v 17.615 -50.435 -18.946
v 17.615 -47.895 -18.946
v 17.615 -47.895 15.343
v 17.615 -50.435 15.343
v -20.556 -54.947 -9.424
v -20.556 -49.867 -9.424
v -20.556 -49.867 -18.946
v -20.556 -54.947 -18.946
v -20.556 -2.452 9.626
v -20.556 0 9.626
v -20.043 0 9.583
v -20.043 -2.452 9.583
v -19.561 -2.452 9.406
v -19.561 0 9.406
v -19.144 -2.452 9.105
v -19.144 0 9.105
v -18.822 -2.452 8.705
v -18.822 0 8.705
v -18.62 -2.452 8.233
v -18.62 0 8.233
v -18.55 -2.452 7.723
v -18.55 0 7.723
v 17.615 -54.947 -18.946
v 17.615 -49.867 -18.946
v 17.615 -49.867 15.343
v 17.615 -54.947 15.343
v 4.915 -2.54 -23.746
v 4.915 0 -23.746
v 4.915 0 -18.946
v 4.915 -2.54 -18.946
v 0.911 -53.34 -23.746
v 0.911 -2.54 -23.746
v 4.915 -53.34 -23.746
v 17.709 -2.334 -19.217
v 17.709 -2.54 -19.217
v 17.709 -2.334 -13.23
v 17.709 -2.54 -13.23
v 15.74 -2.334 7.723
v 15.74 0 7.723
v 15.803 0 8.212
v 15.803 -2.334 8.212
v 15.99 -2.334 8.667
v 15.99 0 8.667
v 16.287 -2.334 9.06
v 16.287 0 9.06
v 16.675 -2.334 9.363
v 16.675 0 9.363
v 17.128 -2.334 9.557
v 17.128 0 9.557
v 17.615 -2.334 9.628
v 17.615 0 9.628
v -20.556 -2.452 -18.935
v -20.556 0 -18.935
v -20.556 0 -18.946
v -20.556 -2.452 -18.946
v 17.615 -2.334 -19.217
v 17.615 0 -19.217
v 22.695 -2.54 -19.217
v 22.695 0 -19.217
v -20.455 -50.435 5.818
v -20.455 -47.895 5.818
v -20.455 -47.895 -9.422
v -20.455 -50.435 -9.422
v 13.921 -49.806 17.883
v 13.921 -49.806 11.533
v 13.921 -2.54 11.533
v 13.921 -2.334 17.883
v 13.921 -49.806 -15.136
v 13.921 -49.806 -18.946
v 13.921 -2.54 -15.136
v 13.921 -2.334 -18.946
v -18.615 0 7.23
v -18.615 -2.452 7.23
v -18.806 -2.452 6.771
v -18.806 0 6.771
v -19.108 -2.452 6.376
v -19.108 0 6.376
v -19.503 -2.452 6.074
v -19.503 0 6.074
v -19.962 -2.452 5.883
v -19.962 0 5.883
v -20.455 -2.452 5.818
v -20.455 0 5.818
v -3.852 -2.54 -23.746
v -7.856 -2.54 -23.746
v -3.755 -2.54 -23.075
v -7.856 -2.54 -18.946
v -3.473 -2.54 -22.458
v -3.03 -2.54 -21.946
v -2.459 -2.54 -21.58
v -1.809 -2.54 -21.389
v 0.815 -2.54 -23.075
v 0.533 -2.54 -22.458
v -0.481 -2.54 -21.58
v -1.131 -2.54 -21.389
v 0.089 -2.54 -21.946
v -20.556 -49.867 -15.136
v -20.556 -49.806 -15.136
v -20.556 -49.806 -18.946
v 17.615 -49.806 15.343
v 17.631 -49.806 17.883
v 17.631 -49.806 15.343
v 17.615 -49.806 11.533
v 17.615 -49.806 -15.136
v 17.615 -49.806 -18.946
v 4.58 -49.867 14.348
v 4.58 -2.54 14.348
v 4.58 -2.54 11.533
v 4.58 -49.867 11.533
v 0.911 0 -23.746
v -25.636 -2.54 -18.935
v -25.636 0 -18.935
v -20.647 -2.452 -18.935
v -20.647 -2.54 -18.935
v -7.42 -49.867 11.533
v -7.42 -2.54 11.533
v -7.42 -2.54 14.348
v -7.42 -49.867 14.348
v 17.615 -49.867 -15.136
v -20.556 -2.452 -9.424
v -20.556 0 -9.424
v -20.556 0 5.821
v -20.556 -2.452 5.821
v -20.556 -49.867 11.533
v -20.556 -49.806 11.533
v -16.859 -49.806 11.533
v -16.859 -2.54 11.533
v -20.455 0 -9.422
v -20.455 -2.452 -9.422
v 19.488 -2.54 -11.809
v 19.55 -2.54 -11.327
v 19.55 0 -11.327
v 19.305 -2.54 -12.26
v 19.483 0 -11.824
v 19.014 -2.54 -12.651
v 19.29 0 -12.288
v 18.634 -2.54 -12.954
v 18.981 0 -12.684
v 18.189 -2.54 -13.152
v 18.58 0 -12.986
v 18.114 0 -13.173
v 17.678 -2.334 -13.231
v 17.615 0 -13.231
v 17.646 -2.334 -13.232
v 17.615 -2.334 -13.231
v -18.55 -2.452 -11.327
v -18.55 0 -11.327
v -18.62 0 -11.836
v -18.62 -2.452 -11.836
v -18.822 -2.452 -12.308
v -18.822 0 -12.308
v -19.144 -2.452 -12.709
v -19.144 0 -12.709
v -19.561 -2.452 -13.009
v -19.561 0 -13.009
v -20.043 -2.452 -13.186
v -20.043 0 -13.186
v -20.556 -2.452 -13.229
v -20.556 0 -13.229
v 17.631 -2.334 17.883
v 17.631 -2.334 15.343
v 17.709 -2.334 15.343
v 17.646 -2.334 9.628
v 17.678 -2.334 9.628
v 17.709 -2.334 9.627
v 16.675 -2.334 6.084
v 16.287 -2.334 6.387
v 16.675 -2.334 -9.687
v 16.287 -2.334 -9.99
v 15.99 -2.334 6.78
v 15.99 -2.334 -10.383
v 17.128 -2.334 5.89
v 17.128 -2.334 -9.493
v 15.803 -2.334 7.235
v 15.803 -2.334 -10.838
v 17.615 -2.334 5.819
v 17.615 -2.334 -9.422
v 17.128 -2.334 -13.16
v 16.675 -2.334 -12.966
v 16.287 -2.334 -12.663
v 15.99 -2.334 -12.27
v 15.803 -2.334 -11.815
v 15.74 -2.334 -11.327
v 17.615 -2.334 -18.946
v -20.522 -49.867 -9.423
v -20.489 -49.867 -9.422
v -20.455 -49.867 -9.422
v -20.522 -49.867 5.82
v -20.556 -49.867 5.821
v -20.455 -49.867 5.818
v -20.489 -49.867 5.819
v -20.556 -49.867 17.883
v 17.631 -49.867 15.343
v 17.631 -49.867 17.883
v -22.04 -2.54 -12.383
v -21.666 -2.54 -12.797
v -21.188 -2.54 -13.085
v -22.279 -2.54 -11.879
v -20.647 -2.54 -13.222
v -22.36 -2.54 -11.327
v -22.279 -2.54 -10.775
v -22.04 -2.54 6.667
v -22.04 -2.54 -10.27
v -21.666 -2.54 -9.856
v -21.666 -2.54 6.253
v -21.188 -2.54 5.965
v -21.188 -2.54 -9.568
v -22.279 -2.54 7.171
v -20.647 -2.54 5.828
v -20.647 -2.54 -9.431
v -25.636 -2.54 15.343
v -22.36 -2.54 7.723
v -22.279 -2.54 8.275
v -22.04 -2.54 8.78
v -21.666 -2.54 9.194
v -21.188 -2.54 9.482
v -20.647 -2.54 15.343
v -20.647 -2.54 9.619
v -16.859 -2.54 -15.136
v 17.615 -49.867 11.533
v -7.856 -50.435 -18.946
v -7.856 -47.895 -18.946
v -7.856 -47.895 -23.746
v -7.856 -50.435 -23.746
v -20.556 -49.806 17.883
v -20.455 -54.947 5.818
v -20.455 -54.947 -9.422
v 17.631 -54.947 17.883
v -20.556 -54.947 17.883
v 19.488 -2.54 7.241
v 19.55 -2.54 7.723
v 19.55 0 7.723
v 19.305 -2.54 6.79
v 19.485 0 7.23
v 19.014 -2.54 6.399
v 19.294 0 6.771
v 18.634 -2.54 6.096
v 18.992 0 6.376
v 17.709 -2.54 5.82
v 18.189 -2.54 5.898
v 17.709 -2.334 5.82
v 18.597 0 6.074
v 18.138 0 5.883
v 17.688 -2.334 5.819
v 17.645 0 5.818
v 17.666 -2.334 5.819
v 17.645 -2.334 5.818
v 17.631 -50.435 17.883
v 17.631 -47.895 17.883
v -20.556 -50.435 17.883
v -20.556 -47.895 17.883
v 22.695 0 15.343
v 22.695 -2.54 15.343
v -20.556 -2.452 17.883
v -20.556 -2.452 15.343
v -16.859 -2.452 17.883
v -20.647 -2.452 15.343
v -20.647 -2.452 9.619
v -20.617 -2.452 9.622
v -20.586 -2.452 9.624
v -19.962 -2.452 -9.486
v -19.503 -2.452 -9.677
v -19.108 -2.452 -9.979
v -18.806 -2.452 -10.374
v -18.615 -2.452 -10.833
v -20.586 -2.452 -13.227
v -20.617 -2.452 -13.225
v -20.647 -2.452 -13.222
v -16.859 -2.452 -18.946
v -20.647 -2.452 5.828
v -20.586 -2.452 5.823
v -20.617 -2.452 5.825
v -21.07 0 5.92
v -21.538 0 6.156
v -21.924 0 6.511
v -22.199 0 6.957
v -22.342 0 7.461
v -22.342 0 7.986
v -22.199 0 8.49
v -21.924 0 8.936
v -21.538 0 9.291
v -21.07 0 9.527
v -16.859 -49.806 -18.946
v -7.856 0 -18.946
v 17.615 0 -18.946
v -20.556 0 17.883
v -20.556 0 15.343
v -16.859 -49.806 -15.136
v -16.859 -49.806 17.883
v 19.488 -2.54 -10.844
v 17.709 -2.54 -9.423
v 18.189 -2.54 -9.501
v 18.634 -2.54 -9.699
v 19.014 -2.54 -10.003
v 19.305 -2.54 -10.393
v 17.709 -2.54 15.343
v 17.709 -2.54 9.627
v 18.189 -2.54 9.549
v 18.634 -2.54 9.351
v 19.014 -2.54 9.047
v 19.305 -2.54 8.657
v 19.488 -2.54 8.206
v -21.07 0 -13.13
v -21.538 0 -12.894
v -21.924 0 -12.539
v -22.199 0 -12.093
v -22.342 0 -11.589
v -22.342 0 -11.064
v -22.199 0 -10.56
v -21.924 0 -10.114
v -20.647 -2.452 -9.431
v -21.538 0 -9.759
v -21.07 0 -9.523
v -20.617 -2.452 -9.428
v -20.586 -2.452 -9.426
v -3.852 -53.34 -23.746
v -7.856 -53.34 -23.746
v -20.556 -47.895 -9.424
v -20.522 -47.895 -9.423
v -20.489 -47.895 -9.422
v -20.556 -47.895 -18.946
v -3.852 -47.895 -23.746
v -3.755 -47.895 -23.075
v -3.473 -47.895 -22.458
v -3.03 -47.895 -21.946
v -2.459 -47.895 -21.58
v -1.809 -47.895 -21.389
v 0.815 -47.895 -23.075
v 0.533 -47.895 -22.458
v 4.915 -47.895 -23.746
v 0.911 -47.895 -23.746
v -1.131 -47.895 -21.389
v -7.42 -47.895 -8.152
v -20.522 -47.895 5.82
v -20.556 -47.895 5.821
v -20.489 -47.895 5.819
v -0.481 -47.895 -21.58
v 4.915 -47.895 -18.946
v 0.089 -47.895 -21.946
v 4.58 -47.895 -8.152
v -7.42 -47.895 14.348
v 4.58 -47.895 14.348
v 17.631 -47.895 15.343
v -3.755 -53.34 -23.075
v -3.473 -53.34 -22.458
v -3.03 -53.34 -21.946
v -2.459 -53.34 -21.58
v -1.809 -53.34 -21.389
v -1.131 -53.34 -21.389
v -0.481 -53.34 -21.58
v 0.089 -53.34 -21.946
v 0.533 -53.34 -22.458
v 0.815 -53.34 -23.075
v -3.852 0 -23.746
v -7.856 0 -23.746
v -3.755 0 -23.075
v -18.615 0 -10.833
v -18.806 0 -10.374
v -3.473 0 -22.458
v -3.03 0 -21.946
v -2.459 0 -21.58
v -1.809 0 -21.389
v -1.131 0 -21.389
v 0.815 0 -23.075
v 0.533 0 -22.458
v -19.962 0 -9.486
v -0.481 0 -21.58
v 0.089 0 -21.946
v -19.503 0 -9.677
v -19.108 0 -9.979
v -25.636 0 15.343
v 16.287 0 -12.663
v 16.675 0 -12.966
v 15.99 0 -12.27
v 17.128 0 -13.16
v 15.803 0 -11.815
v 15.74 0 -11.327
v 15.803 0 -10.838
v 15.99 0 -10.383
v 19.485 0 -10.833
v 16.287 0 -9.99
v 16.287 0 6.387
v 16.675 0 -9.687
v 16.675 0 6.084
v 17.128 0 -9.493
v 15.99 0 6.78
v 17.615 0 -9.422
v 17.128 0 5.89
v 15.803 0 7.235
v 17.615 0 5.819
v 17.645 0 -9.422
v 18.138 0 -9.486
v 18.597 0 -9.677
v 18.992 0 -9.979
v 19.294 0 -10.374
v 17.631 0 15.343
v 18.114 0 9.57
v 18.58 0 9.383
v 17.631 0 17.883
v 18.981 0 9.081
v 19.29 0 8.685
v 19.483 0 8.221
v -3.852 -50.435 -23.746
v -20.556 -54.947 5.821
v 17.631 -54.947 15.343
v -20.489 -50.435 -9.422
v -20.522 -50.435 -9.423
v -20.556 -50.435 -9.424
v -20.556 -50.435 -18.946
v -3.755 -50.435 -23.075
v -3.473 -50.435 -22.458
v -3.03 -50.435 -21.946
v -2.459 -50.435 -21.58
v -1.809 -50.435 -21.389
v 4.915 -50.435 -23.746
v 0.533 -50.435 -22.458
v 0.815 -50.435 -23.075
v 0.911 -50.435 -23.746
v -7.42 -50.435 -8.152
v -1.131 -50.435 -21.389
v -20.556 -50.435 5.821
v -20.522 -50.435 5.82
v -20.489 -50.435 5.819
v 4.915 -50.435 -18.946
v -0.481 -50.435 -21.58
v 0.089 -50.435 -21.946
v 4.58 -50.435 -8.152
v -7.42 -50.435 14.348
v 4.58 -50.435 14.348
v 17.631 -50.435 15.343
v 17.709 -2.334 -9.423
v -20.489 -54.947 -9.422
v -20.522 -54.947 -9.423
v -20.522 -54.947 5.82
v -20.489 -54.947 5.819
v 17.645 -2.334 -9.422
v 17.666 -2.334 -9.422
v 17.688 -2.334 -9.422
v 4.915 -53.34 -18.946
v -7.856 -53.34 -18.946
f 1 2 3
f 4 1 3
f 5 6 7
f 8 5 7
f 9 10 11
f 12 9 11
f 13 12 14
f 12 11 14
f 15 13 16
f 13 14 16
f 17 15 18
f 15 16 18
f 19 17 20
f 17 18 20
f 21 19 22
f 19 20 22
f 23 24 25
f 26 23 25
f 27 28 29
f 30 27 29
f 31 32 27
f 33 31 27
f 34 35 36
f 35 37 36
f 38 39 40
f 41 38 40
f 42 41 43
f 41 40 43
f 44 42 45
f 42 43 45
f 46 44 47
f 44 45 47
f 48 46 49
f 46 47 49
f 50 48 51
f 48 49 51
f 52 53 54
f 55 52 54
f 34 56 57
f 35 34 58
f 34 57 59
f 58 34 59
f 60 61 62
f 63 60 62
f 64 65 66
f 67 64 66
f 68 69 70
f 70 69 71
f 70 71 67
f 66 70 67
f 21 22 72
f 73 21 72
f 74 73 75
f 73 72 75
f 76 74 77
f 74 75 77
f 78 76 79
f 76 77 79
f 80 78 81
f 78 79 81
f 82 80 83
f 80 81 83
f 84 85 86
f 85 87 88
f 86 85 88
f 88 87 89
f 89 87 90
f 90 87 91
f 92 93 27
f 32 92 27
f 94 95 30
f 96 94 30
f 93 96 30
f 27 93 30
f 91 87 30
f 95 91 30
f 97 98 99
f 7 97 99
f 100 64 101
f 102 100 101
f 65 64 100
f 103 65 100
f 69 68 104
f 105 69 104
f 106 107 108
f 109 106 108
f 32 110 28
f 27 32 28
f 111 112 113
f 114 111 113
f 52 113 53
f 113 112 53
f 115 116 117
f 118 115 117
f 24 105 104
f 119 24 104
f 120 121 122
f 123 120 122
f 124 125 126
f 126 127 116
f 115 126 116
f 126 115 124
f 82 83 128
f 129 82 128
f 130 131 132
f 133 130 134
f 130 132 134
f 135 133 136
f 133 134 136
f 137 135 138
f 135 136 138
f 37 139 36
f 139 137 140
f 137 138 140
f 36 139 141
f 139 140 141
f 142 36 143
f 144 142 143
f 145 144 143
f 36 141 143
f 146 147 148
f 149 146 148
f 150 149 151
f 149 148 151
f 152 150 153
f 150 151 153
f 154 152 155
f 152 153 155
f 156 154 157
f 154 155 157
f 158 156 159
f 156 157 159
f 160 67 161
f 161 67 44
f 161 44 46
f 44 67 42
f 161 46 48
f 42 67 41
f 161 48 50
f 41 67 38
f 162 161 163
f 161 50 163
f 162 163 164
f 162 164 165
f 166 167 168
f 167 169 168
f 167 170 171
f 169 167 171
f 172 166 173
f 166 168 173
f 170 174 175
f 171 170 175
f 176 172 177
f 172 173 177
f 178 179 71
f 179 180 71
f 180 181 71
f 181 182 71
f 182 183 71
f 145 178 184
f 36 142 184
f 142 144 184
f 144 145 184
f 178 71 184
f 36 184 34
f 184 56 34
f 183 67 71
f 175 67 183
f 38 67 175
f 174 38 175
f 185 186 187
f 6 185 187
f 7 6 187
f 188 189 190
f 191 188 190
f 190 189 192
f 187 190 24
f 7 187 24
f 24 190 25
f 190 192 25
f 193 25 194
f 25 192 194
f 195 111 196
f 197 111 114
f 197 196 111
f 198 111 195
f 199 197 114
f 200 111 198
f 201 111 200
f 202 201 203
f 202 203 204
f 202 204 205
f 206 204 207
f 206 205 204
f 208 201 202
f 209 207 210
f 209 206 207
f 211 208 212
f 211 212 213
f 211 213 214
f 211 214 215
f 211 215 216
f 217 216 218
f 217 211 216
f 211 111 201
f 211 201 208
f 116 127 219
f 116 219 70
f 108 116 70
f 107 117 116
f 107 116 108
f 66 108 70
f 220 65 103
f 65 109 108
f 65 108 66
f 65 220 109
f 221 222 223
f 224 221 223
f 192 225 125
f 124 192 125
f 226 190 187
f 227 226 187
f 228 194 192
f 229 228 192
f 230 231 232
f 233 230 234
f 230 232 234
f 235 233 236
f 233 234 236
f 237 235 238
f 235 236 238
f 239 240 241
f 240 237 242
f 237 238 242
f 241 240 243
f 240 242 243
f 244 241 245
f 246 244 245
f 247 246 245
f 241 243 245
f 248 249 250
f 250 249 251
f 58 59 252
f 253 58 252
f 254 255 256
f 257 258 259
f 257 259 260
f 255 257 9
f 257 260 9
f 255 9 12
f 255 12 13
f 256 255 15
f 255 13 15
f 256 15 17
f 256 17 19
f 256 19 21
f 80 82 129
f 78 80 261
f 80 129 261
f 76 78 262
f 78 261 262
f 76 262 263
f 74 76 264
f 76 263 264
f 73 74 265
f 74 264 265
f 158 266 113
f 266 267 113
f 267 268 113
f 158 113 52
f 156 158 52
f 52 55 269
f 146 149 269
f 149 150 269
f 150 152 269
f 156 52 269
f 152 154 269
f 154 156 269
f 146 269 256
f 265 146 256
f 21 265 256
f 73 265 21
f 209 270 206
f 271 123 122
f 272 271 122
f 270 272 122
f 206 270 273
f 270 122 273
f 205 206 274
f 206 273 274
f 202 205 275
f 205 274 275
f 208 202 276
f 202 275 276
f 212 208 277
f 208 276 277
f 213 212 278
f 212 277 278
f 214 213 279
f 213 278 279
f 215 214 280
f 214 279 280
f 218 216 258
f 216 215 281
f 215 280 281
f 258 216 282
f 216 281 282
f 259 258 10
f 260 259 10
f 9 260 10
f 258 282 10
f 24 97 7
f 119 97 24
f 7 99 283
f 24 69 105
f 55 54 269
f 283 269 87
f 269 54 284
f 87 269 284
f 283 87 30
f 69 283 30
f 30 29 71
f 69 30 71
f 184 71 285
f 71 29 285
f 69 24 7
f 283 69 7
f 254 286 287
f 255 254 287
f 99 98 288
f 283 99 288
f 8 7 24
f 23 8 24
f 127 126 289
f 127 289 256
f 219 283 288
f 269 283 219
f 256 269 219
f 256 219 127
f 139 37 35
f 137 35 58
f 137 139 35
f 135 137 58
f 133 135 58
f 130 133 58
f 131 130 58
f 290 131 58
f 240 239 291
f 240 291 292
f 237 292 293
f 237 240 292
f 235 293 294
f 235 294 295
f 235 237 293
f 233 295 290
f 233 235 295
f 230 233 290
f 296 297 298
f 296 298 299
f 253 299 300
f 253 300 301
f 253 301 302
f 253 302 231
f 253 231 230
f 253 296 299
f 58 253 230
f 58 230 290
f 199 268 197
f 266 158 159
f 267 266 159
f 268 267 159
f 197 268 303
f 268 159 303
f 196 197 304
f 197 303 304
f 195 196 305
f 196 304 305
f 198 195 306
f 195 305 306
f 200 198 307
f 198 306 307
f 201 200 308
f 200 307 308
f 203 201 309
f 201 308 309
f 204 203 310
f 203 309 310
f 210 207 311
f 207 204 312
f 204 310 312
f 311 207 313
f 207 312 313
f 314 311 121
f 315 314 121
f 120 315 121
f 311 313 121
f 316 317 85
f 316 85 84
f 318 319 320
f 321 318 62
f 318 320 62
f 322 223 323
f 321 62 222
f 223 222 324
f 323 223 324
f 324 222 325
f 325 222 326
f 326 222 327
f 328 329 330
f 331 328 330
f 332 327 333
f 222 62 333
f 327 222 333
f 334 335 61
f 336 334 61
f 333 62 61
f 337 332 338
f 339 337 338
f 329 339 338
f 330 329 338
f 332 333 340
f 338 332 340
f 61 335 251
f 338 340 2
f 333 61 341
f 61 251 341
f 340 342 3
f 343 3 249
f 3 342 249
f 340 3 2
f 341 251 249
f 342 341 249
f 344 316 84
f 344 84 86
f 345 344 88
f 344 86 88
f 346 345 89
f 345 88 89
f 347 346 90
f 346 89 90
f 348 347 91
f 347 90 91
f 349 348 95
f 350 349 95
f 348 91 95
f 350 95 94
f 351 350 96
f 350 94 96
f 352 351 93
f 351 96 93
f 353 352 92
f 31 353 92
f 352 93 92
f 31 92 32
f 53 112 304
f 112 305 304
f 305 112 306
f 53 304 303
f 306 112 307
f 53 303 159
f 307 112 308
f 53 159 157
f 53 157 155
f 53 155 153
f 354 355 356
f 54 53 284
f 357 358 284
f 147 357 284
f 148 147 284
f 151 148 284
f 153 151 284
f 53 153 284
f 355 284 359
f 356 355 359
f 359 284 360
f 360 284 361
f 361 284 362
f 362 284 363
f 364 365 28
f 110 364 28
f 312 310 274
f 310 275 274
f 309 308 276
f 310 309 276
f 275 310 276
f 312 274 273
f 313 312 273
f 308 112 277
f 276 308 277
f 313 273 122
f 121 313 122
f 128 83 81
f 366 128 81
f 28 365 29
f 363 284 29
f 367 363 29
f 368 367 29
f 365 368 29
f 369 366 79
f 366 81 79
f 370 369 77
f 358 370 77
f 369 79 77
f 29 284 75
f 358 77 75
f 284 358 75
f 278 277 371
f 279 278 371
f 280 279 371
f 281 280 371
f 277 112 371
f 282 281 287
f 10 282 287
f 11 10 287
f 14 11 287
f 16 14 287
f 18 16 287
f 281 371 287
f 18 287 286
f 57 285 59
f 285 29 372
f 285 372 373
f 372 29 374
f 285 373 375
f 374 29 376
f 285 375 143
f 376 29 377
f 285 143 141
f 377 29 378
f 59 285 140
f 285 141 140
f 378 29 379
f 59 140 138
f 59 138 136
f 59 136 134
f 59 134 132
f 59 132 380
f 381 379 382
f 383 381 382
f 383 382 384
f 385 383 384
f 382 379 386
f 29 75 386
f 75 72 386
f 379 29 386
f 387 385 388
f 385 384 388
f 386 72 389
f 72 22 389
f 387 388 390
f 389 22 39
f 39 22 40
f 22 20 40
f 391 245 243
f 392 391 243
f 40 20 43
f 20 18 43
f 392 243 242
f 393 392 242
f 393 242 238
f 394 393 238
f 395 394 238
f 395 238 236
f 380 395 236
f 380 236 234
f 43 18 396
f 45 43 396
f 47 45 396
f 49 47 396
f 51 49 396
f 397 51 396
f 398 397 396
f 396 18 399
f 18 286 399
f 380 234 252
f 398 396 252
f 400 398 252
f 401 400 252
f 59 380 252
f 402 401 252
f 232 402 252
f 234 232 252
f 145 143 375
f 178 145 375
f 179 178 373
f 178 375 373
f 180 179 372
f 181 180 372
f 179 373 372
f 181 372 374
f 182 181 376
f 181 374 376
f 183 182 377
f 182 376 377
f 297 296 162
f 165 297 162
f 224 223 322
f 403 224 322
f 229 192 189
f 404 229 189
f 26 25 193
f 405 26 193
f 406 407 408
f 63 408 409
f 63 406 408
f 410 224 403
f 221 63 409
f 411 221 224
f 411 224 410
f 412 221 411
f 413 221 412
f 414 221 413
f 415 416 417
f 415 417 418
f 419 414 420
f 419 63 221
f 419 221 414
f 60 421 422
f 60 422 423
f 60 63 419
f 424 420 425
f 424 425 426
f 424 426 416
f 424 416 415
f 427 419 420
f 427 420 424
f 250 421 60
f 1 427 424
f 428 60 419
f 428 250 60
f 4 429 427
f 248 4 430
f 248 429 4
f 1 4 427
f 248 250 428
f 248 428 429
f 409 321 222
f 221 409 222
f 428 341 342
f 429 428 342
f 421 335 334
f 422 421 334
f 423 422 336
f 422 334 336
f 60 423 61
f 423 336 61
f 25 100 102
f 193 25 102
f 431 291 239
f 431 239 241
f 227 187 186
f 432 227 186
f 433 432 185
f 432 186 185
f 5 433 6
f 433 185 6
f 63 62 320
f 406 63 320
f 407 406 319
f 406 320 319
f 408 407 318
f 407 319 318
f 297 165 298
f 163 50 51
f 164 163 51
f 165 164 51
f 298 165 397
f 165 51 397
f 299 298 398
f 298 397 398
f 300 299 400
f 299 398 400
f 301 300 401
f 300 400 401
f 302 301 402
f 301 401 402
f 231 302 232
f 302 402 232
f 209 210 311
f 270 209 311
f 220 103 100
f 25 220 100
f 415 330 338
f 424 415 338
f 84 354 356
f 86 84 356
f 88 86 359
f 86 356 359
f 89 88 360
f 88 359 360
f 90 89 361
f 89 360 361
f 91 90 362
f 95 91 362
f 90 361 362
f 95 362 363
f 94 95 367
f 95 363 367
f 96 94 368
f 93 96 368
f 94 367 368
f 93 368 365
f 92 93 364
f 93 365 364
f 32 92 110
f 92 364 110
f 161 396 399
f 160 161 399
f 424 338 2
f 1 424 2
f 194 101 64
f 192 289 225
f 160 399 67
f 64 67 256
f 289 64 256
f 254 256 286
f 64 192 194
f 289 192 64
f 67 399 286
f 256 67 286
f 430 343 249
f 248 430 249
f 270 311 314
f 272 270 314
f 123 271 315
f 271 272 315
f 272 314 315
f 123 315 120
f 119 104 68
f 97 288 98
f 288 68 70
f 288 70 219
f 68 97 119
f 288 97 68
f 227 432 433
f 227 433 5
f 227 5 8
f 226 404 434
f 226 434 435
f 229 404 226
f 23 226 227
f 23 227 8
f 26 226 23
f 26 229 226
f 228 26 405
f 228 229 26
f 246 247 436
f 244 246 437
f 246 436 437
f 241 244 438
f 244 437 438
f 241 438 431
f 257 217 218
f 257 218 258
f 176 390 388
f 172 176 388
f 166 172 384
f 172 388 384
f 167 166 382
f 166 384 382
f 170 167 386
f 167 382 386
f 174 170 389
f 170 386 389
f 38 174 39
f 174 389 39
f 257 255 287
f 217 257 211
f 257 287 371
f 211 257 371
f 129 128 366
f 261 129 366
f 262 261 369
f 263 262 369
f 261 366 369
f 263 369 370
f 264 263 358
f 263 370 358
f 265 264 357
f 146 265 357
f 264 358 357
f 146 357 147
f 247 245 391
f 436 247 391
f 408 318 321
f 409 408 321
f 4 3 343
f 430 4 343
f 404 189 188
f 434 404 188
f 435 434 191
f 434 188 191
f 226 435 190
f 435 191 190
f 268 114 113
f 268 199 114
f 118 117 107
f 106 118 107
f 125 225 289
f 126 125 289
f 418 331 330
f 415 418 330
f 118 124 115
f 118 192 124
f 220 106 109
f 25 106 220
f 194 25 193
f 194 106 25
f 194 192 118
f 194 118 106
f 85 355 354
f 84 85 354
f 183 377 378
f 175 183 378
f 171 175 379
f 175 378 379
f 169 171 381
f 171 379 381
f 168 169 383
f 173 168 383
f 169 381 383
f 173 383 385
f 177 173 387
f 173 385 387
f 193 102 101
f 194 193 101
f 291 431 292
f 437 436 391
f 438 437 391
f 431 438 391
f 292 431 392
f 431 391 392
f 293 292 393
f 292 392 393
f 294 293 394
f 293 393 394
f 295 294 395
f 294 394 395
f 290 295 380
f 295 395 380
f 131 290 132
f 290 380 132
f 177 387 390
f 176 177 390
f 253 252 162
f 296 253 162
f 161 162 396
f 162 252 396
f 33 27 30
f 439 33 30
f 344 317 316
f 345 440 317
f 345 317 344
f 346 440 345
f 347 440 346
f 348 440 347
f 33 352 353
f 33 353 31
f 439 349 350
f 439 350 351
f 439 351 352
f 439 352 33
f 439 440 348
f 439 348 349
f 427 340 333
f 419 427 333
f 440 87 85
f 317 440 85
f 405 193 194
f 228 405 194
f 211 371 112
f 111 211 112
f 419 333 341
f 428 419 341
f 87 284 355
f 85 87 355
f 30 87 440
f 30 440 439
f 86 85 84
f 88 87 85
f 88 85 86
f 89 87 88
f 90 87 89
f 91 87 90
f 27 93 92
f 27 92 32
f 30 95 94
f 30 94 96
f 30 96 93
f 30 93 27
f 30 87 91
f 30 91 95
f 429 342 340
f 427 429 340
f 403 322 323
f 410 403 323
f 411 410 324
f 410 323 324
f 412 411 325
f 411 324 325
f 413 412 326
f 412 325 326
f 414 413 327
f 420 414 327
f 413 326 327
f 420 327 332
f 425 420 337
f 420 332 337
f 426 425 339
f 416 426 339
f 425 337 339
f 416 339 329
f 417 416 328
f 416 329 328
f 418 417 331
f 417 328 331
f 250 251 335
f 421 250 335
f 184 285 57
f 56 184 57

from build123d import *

# Parameters (mm, degrees)
F0_W          = 6.0148409306
F0_H          = 9.525
F0_W_2        = 5.9851590694
F0_H_2        = 6.35
F0_W_3        = 12
F0_H_3        = 2.815
F1_DEPTH      = 2.54
F2_START      = 2.54
F2_DEPTH      = 47.326875
F3_START      = 49.866875
F3_DEPTH      = 5.08
F4_START      = 47.894875
F4_DEPTH      = 2.54
F5_DEPTH      = 50.8
F6_W          = 3.7882840261
F6_H          = 47.471923288
F6_W_2        = 3.7882830948
F6_H_2        = 47.3535386845
F7_DEPTH      = 25.4
F7_DEPTH_BACK = 25.4


# Not quite as in the source:
# - a feature names something its author has since deleted; it is built from what else it names


with BuildPart() as f1:
    # F0 (on Front) → F1 (new body)
    with BuildSketch(Plane.XZ):
        with BuildLine():
            Line((4.9150146872, -18.9464773988), (-7.8555241555, -18.9464773988))
            Line((-7.8555241555, -18.9464773988), (-7.8555241555, -23.7456746399))
            Line((-7.8555241555, -23.7456746399), (-3.8515047342, -23.7456746399))
            ThreePointArc((-3.8515047342, -23.7456746399), (-1.4702547342, -21.3644246399), (0.9109952658, -23.7456746399))
            Line((0.9109952658, -23.7456746399), (4.9150146872, -23.7456746399))
            Line((4.9150146872, -23.7456746399), (4.9150146872, -18.9464773988))
        make_face()
        Polygon((-20.5555241555, 11.5334648176), (-7.4201510128, 11.5334648176), (-7.4201510128, 14.3484648176), (4.5798489872, 14.3484648176), (4.5798489872, 11.5334648176), (17.6150146872, 11.5334648176), (17.6150146872, 15.3434648176), (-20.5555241555, 15.3434648176), align=None)
        Polygon((17.6150146872, -15.1364773988), (-20.5555241555, -15.1364773988), (-20.5555241555, -18.9351737499), (-20.5555241555, -18.9464773988), (-7.8555241555, -18.9464773988), (4.9150146872, -18.9464773988), (17.6150146872, -18.9464773988), align=None)
        with BuildLine():
            Line((17.6150146872, 15.3434648176), (17.6150146872, 11.5334648176))
            Line((17.6150146872, 11.5334648176), (17.6150146872, 9.6282336699))
            ThreePointArc((17.6150146872, 9.6282336699), (18.9811953771, 9.0809544703), (19.5496899178, 7.7234648176))
            ThreePointArc((19.5496899178, 7.7234648176), (18.9917283359, 6.3764263994), (17.6446899178, 5.8184648176))
            Line((17.6446899178, 5.8184648176), (17.6446899178, -1.8015351824))
            Line((17.6446899178, -1.8015351824), (17.6446899178, -9.4215351824))
            ThreePointArc((17.6446899178, -9.4215351824), (18.9917283359, -9.9794967643), (19.5496899178, -11.3265351824))
            ThreePointArc((19.5496899178, -11.3265351824), (18.9811953771, -12.6840248351), (17.6150146872, -13.2313040347))
            Line((17.6150146872, -13.2313040347), (17.6150146872, -15.1364773988))
            Line((17.6150146872, -15.1364773988), (17.6150146872, -18.9464773988))
            Line((17.6150146872, -18.9464773988), (17.6150146872, -19.2168746144))
            Line((17.6150146872, -19.2168746144), (22.6950146872, -19.2168746144))
            Line((22.6950146872, -19.2168746144), (22.6950146872, 15.3434648176))
            Line((22.6950146872, 15.3434648176), (17.6306664944, 15.3434648176))
            Line((17.6306664944, 15.3434648176), (17.6150146872, 15.3434648176))
        make_face()
        with BuildLine():
            ThreePointArc((-20.5555241555, 5.8211025651), (-22.3603100822, 7.7234648176), (-20.5555241555, 9.62582707))
            Line((-20.5555241555, 9.62582707), (-20.5555241555, 11.5334648176))
            Line((-20.5555241555, 11.5334648176), (-20.5555241555, 15.3434648176))
            Line((-20.5555241555, 15.3434648176), (-25.6355241555, 15.3434648176))
            Line((-25.6355241555, 15.3434648176), (-25.6355241555, -18.9351737499))
            Line((-25.6355241555, -18.9351737499), (-20.5555241555, -18.9351737499))
            Line((-20.5555241555, -18.9351737499), (-20.5555241555, -15.1364773988))
            Line((-20.5555241555, -15.1364773988), (-20.5555241555, -13.2288974349))
            ThreePointArc((-20.5555241555, -13.2288974349), (-22.3603100822, -11.3265351824), (-20.5555241555, -9.42417293))
            Line((-20.5555241555, -9.42417293), (-20.5555241555, 5.8211025651))
        make_face()
        with BuildLine():
            Line((4.5798489872, 11.5334648176), (4.5798489872, 7.7234648176))
            Line((4.5798489872, 7.7234648176), (15.7396899178, 7.7234648176))
            ThreePointArc((15.7396899178, 7.7234648176), (16.2872002651, 9.0599702769), (17.6150146872, 9.6282336699))
            Line((17.6150146872, 9.6282336699), (17.6150146872, 11.5334648176))
            Line((17.6150146872, 11.5334648176), (4.5798489872, 11.5334648176))
        make_face()
        Polygon((-7.4201510128, 11.5334648176), (-7.4201510128, 7.7234648176), (-1.4053100822, 7.7234648176), (4.5798489872, 7.7234648176), (4.5798489872, 11.5334648176), align=None)
        with BuildLine():
            ThreePointArc((-20.5555241555, 9.62582707), (-19.1441813337, 9.1054801593), (-18.5503100822, 7.7234648176))
            Line((-18.5503100822, 7.7234648176), (-7.4201510128, 7.7234648176))
            Line((-7.4201510128, 7.7234648176), (-7.4201510128, 11.5334648176))
            Line((-7.4201510128, 11.5334648176), (-20.5555241555, 11.5334648176))
            Line((-20.5555241555, 11.5334648176), (-20.5555241555, 9.62582707))
        make_face()
        with BuildLine():
            Line((-1.4053100822, -11.3265351824), (-18.5503100822, -11.3265351824))
            ThreePointArc((-18.5503100822, -11.3265351824), (-19.1441813337, -12.7085505242), (-20.5555241555, -13.2288974349))
            Line((-20.5555241555, -13.2288974349), (-20.5555241555, -15.1364773988))
            Line((-20.5555241555, -15.1364773988), (17.6150146872, -15.1364773988))
            Line((17.6150146872, -15.1364773988), (17.6150146872, -13.2313040347))
            ThreePointArc((17.6150146872, -13.2313040347), (16.2872002651, -12.6630406418), (15.7396899178, -11.3265351824))
            Line((15.7396899178, -11.3265351824), (-1.4053100822, -11.3265351824))
        make_face()
        with BuildLine():
            Line((-7.4201510128, 7.7234648176), (-18.5503100822, 7.7234648176))
            ThreePointArc((-18.5503100822, 7.7234648176), (-19.1082716641, 6.3764263994), (-20.4553100822, 5.8184648176))
            Line((-20.4553100822, 5.8184648176), (-20.4553100822, -1.8015351824))
            Line((-20.4553100822, -1.8015351824), (-7.4201510128, -1.8015351824))
            Line((-7.4201510128, -1.8015351824), (-7.4201510128, 7.7234648176))
        make_face()
        with Locations((-4.4127305475, 2.9609648176)):
            Rectangle(F0_W, F0_H)
        with Locations((1.5872694525, 2.9609648176)):
            Rectangle(F0_W_2, F0_H)
        with BuildLine():
            Line((17.6150146872, -1.8015351824), (4.5798489872, -1.8015351824))
            Line((4.5798489872, -1.8015351824), (4.5798489872, -8.1515351824))
            Line((4.5798489872, -8.1515351824), (-1.4053100822, -8.1515351824))
            Line((-1.4053100822, -8.1515351824), (-1.4053100822, -11.3265351824))
            Line((-1.4053100822, -11.3265351824), (15.7396899178, -11.3265351824))
            ThreePointArc((15.7396899178, -11.3265351824), (16.2872002651, -9.9900297231), (17.6150146872, -9.4217663301))
            Line((17.6150146872, -9.4217663301), (17.6150146872, -1.8015351824))
        make_face()
        with BuildLine():
            Line((-7.4201510128, -1.8015351824), (-20.4553100822, -1.8015351824))
            Line((-20.4553100822, -1.8015351824), (-20.4553100822, -9.4215351824))
            ThreePointArc((-20.4553100822, -9.4215351824), (-19.1082716641, -9.9794967643), (-18.5503100822, -11.3265351824))
            Line((-18.5503100822, -11.3265351824), (-1.4053100822, -11.3265351824))
            Line((-1.4053100822, -11.3265351824), (-1.4053100822, -8.1515351824))
            Line((-1.4053100822, -8.1515351824), (-7.4201510128, -8.1515351824))
            Line((-7.4201510128, -8.1515351824), (-7.4201510128, -1.8015351824))
        make_face()
        with Locations((-4.4127305475, -4.9765351824)):
            Rectangle(F0_W, F0_H_2)
        with Locations((1.5872694525, -4.9765351824)):
            Rectangle(F0_W_2, F0_H_2)
        with BuildLine():
            Line((15.7396899178, 7.7234648176), (4.5798489872, 7.7234648176))
            Line((4.5798489872, 7.7234648176), (4.5798489872, -1.8015351824))
            Line((4.5798489872, -1.8015351824), (17.6150146872, -1.8015351824))
            Line((17.6150146872, -1.8015351824), (17.6150146872, 5.8186959653))
            ThreePointArc((17.6150146872, 5.8186959653), (16.2872002651, 6.3869593582), (15.7396899178, 7.7234648176))
        make_face()
        with Locations((-1.4201510128, 12.9409648176)):
            Rectangle(F0_W_3, F0_H_3)
        Polygon((-20.5555241555, 17.8834648176), (-20.5555241555, 15.3434648176), (17.6150146872, 15.3434648176), (17.6306664944, 15.3434648176), (17.6306664944, 17.8834648176), align=None)
    extrude(amount=F1_DEPTH)

    # F0 (on Front) → F2 (join)
    with BuildSketch(Plane.XZ.offset(F2_START)):
        Polygon((-20.5555241555, 11.5334648176), (-7.4201510128, 11.5334648176), (-7.4201510128, 14.3484648176), (4.5798489872, 14.3484648176), (4.5798489872, 11.5334648176), (17.6150146872, 11.5334648176), (17.6150146872, 15.3434648176), (-20.5555241555, 15.3434648176), align=None)
        Polygon((17.6150146872, -15.1364773988), (-20.5555241555, -15.1364773988), (-20.5555241555, -18.9351737499), (-20.5555241555, -18.9464773988), (-7.8555241555, -18.9464773988), (4.9150146872, -18.9464773988), (17.6150146872, -18.9464773988), align=None)
        Polygon((-20.5555241555, 17.8834648176), (-20.5555241555, 15.3434648176), (17.6150146872, 15.3434648176), (17.6306664944, 15.3434648176), (17.6306664944, 17.8834648176), align=None)
    extrude(amount=F2_DEPTH)


with BuildPart() as f3:
    # F0 (on Front) → F3 (new body)
    with BuildSketch(Plane.XZ.offset(F3_START)):
        Polygon((-20.5555241555, 11.5334648176), (-7.4201510128, 11.5334648176), (-7.4201510128, 14.3484648176), (4.5798489872, 14.3484648176), (4.5798489872, 11.5334648176), (17.6150146872, 11.5334648176), (17.6150146872, 15.3434648176), (-20.5555241555, 15.3434648176), align=None)
        Polygon((17.6150146872, -15.1364773988), (-20.5555241555, -15.1364773988), (-20.5555241555, -18.9351737499), (-20.5555241555, -18.9464773988), (-7.8555241555, -18.9464773988), (4.9150146872, -18.9464773988), (17.6150146872, -18.9464773988), align=None)
        with BuildLine():
            Line((4.5798489872, 11.5334648176), (4.5798489872, 7.7234648176))
            Line((4.5798489872, 7.7234648176), (15.7396899178, 7.7234648176))
            ThreePointArc((15.7396899178, 7.7234648176), (16.2872002651, 9.0599702769), (17.6150146872, 9.6282336699))
            Line((17.6150146872, 9.6282336699), (17.6150146872, 11.5334648176))
            Line((17.6150146872, 11.5334648176), (4.5798489872, 11.5334648176))
        make_face()
        Polygon((-7.4201510128, 11.5334648176), (-7.4201510128, 7.7234648176), (-1.4053100822, 7.7234648176), (4.5798489872, 7.7234648176), (4.5798489872, 11.5334648176), align=None)
        with BuildLine():
            ThreePointArc((-20.5555241555, 9.62582707), (-19.1441813337, 9.1054801593), (-18.5503100822, 7.7234648176))
            Line((-18.5503100822, 7.7234648176), (-7.4201510128, 7.7234648176))
            Line((-7.4201510128, 7.7234648176), (-7.4201510128, 11.5334648176))
            Line((-7.4201510128, 11.5334648176), (-20.5555241555, 11.5334648176))
            Line((-20.5555241555, 11.5334648176), (-20.5555241555, 9.62582707))
        make_face()
        with BuildLine():
            Line((-20.4553100822, 5.8184648176), (-20.4553100822, 7.7234648176))
            Line((-20.4553100822, 7.7234648176), (-18.5503100822, 7.7234648176))
            ThreePointArc((-18.5503100822, 7.7234648176), (-19.1441813337, 9.1054801593), (-20.5555241555, 9.62582707))
            Line((-20.5555241555, 9.62582707), (-20.5555241555, 5.8211025651))
            ThreePointArc((-20.5555241555, 5.8211025651), (-20.505434473, 5.8191243686), (-20.4553100822, 5.8184648176))
        make_face()
        with BuildLine():
            Line((-1.4053100822, -11.3265351824), (-18.5503100822, -11.3265351824))
            ThreePointArc((-18.5503100822, -11.3265351824), (-19.1441813337, -12.7085505242), (-20.5555241555, -13.2288974349))
            Line((-20.5555241555, -13.2288974349), (-20.5555241555, -15.1364773988))
            Line((-20.5555241555, -15.1364773988), (17.6150146872, -15.1364773988))
            Line((17.6150146872, -15.1364773988), (17.6150146872, -13.2313040347))
            ThreePointArc((17.6150146872, -13.2313040347), (16.2872002651, -12.6630406418), (15.7396899178, -11.3265351824))
            Line((15.7396899178, -11.3265351824), (-1.4053100822, -11.3265351824))
        make_face()
        with BuildLine():
            ThreePointArc((-18.5503100822, -11.3265351824), (-19.1082716641, -9.9794967643), (-20.4553100822, -9.4215351824))
            Line((-20.4553100822, -9.4215351824), (-20.4553100822, -11.3265351824))
            Line((-20.4553100822, -11.3265351824), (-18.5503100822, -11.3265351824))
        make_face()
        with BuildLine():
            Line((-20.4553100822, -11.3265351824), (-20.4553100822, -9.4215351824))
            ThreePointArc((-20.4553100822, -9.4215351824), (-20.505434473, -9.4221947335), (-20.5555241555, -9.42417293))
            Line((-20.5555241555, -9.42417293), (-20.5555241555, -13.2288974349))
            ThreePointArc((-20.5555241555, -13.2288974349), (-19.1441813337, -12.7085505242), (-18.5503100822, -11.3265351824))
            Line((-18.5503100822, -11.3265351824), (-20.4553100822, -11.3265351824))
        make_face()
        with BuildLine():
            Line((17.6150146872, -11.3265351824), (15.7396899178, -11.3265351824))
            ThreePointArc((15.7396899178, -11.3265351824), (16.2872002651, -12.6630406418), (17.6150146872, -13.2313040347))
            Line((17.6150146872, -13.2313040347), (17.6150146872, -11.3265351824))
        make_face()
        with BuildLine():
            ThreePointArc((17.6150146872, -9.4217663301), (16.2872002651, -9.9900297231), (15.7396899178, -11.3265351824))
            Line((15.7396899178, -11.3265351824), (17.6150146872, -11.3265351824))
            Line((17.6150146872, -11.3265351824), (17.6150146872, -9.4217663301))
        make_face()
        with BuildLine():
            ThreePointArc((17.6150146872, 9.6282336699), (16.2872002651, 9.0599702769), (15.7396899178, 7.7234648176))
            Line((15.7396899178, 7.7234648176), (17.6150146872, 7.7234648176))
            Line((17.6150146872, 7.7234648176), (17.6150146872, 9.6282336699))
        make_face()
        with BuildLine():
            Line((17.6150146872, 7.7234648176), (15.7396899178, 7.7234648176))
            ThreePointArc((15.7396899178, 7.7234648176), (16.2872002651, 6.3869593582), (17.6150146872, 5.8186959653))
            Line((17.6150146872, 5.8186959653), (17.6150146872, 7.7234648176))
        make_face()
        with BuildLine():
            Line((-18.5503100822, 7.7234648176), (-20.4553100822, 7.7234648176))
            Line((-20.4553100822, 7.7234648176), (-20.4553100822, 5.8184648176))
            ThreePointArc((-20.4553100822, 5.8184648176), (-19.1082716641, 6.3764263994), (-18.5503100822, 7.7234648176))
        make_face()
        with BuildLine():
            Line((15.7396899178, 7.7234648176), (4.5798489872, 7.7234648176))
            Line((4.5798489872, 7.7234648176), (4.5798489872, -1.8015351824))
            Line((4.5798489872, -1.8015351824), (17.6150146872, -1.8015351824))
            Line((17.6150146872, -1.8015351824), (17.6150146872, 5.8186959653))
            ThreePointArc((17.6150146872, 5.8186959653), (16.2872002651, 6.3869593582), (15.7396899178, 7.7234648176))
        make_face()
        with Locations((-1.4201510128, 12.9409648176)):
            Rectangle(F0_W_3, F0_H_3)
        with BuildLine():
            Line((-7.4201510128, 7.7234648176), (-18.5503100822, 7.7234648176))
            ThreePointArc((-18.5503100822, 7.7234648176), (-19.1082716641, 6.3764263994), (-20.4553100822, 5.8184648176))
            Line((-20.4553100822, 5.8184648176), (-20.4553100822, -1.8015351824))
            Line((-20.4553100822, -1.8015351824), (-7.4201510128, -1.8015351824))
            Line((-7.4201510128, -1.8015351824), (-7.4201510128, 7.7234648176))
        make_face()
        with Locations((-4.4127305475, 2.9609648176)):
            Rectangle(F0_W, F0_H)
        with BuildLine():
            Line((17.6150146872, -1.8015351824), (4.5798489872, -1.8015351824))
            Line((4.5798489872, -1.8015351824), (4.5798489872, -8.1515351824))
            Line((4.5798489872, -8.1515351824), (-1.4053100822, -8.1515351824))
            Line((-1.4053100822, -8.1515351824), (-1.4053100822, -11.3265351824))
            Line((-1.4053100822, -11.3265351824), (15.7396899178, -11.3265351824))
            ThreePointArc((15.7396899178, -11.3265351824), (16.2872002651, -9.9900297231), (17.6150146872, -9.4217663301))
            Line((17.6150146872, -9.4217663301), (17.6150146872, -1.8015351824))
        make_face()
        with BuildLine():
            Line((-7.4201510128, -1.8015351824), (-20.4553100822, -1.8015351824))
            Line((-20.4553100822, -1.8015351824), (-20.4553100822, -9.4215351824))
            ThreePointArc((-20.4553100822, -9.4215351824), (-19.1082716641, -9.9794967643), (-18.5503100822, -11.3265351824))
            Line((-18.5503100822, -11.3265351824), (-1.4053100822, -11.3265351824))
            Line((-1.4053100822, -11.3265351824), (-1.4053100822, -8.1515351824))
            Line((-1.4053100822, -8.1515351824), (-7.4201510128, -8.1515351824))
            Line((-7.4201510128, -8.1515351824), (-7.4201510128, -1.8015351824))
        make_face()
        with Locations((-4.4127305475, -4.9765351824)):
            Rectangle(F0_W, F0_H_2)
        with Locations((1.5872694525, -4.9765351824)):
            Rectangle(F0_W_2, F0_H_2)
        with Locations((1.5872694525, 2.9609648176)):
            Rectangle(F0_W_2, F0_H)
        Polygon((-20.5555241555, 17.8834648176), (-20.5555241555, 15.3434648176), (17.6150146872, 15.3434648176), (17.6306664944, 15.3434648176), (17.6306664944, 17.8834648176), align=None)
    extrude(amount=F3_DEPTH)


with BuildPart() as f4:
    # F0 (on Front) → F4 (new body)
    with BuildSketch(Plane.XZ.offset(F4_START)):
        with BuildLine():
            Line((-18.5503100822, 7.7234648176), (-20.4553100822, 7.7234648176))
            Line((-20.4553100822, 7.7234648176), (-20.4553100822, 5.8184648176))
            ThreePointArc((-20.4553100822, 5.8184648176), (-19.1082716641, 6.3764263994), (-18.5503100822, 7.7234648176))
        make_face()
        with BuildLine():
            ThreePointArc((-18.5503100822, -11.3265351824), (-19.1082716641, -9.9794967643), (-20.4553100822, -9.4215351824))
            Line((-20.4553100822, -9.4215351824), (-20.4553100822, -11.3265351824))
            Line((-20.4553100822, -11.3265351824), (-18.5503100822, -11.3265351824))
        make_face()
        with BuildLine():
            ThreePointArc((17.6150146872, -9.4217663301), (16.2872002651, -9.9900297231), (15.7396899178, -11.3265351824))
            Line((15.7396899178, -11.3265351824), (17.6150146872, -11.3265351824))
            Line((17.6150146872, -11.3265351824), (17.6150146872, -9.4217663301))
        make_face()
        with BuildLine():
            Line((17.6150146872, 7.7234648176), (15.7396899178, 7.7234648176))
            ThreePointArc((15.7396899178, 7.7234648176), (16.2872002651, 6.3869593582), (17.6150146872, 5.8186959653))
            Line((17.6150146872, 5.8186959653), (17.6150146872, 7.7234648176))
        make_face()
        with BuildLine():
            Line((-7.4201510128, 7.7234648176), (-18.5503100822, 7.7234648176))
            ThreePointArc((-18.5503100822, 7.7234648176), (-19.1082716641, 6.3764263994), (-20.4553100822, 5.8184648176))
            Line((-20.4553100822, 5.8184648176), (-20.4553100822, -1.8015351824))
            Line((-20.4553100822, -1.8015351824), (-7.4201510128, -1.8015351824))
            Line((-7.4201510128, -1.8015351824), (-7.4201510128, 7.7234648176))
        make_face()
        with BuildLine():
            Line((4.5798489872, 11.5334648176), (4.5798489872, 7.7234648176))
            Line((4.5798489872, 7.7234648176), (15.7396899178, 7.7234648176))
            ThreePointArc((15.7396899178, 7.7234648176), (16.2872002651, 9.0599702769), (17.6150146872, 9.6282336699))
            Line((17.6150146872, 9.6282336699), (17.6150146872, 11.5334648176))
            Line((17.6150146872, 11.5334648176), (4.5798489872, 11.5334648176))
        make_face()
        with BuildLine():
            Line((15.7396899178, 7.7234648176), (4.5798489872, 7.7234648176))
            Line((4.5798489872, 7.7234648176), (4.5798489872, -1.8015351824))
            Line((4.5798489872, -1.8015351824), (17.6150146872, -1.8015351824))
            Line((17.6150146872, -1.8015351824), (17.6150146872, 5.8186959653))
            ThreePointArc((17.6150146872, 5.8186959653), (16.2872002651, 6.3869593582), (15.7396899178, 7.7234648176))
        make_face()
        with BuildLine():
            Line((17.6150146872, -1.8015351824), (4.5798489872, -1.8015351824))
            Line((4.5798489872, -1.8015351824), (4.5798489872, -8.1515351824))
            Line((4.5798489872, -8.1515351824), (-1.4053100822, -8.1515351824))
            Line((-1.4053100822, -8.1515351824), (-1.4053100822, -11.3265351824))
            Line((-1.4053100822, -11.3265351824), (15.7396899178, -11.3265351824))
            ThreePointArc((15.7396899178, -11.3265351824), (16.2872002651, -9.9900297231), (17.6150146872, -9.4217663301))
            Line((17.6150146872, -9.4217663301), (17.6150146872, -1.8015351824))
        make_face()
        with BuildLine():
            Line((-7.4201510128, -1.8015351824), (-20.4553100822, -1.8015351824))
            Line((-20.4553100822, -1.8015351824), (-20.4553100822, -9.4215351824))
            ThreePointArc((-20.4553100822, -9.4215351824), (-19.1082716641, -9.9794967643), (-18.5503100822, -11.3265351824))
            Line((-18.5503100822, -11.3265351824), (-1.4053100822, -11.3265351824))
            Line((-1.4053100822, -11.3265351824), (-1.4053100822, -8.1515351824))
            Line((-1.4053100822, -8.1515351824), (-7.4201510128, -8.1515351824))
            Line((-7.4201510128, -8.1515351824), (-7.4201510128, -1.8015351824))
        make_face()
        Polygon((-20.5555241555, 11.5334648176), (-7.4201510128, 11.5334648176), (-7.4201510128, 14.3484648176), (4.5798489872, 14.3484648176), (4.5798489872, 11.5334648176), (17.6150146872, 11.5334648176), (17.6150146872, 15.3434648176), (-20.5555241555, 15.3434648176), align=None)
        Polygon((-20.5555241555, 17.8834648176), (-20.5555241555, 15.3434648176), (17.6150146872, 15.3434648176), (17.6306664944, 15.3434648176), (17.6306664944, 17.8834648176), align=None)
        with BuildLine():
            ThreePointArc((-20.5555241555, 9.62582707), (-19.1441813337, 9.1054801593), (-18.5503100822, 7.7234648176))
            Line((-18.5503100822, 7.7234648176), (-7.4201510128, 7.7234648176))
            Line((-7.4201510128, 7.7234648176), (-7.4201510128, 11.5334648176))
            Line((-7.4201510128, 11.5334648176), (-20.5555241555, 11.5334648176))
            Line((-20.5555241555, 11.5334648176), (-20.5555241555, 9.62582707))
        make_face()
        with BuildLine():
            Line((-20.4553100822, 5.8184648176), (-20.4553100822, 7.7234648176))
            Line((-20.4553100822, 7.7234648176), (-18.5503100822, 7.7234648176))
            ThreePointArc((-18.5503100822, 7.7234648176), (-19.1441813337, 9.1054801593), (-20.5555241555, 9.62582707))
            Line((-20.5555241555, 9.62582707), (-20.5555241555, 5.8211025651))
            ThreePointArc((-20.5555241555, 5.8211025651), (-20.505434473, 5.8191243686), (-20.4553100822, 5.8184648176))
        make_face()
        with BuildLine():
            ThreePointArc((17.6150146872, 9.6282336699), (16.2872002651, 9.0599702769), (15.7396899178, 7.7234648176))
            Line((15.7396899178, 7.7234648176), (17.6150146872, 7.7234648176))
            Line((17.6150146872, 7.7234648176), (17.6150146872, 9.6282336699))
        make_face()
        Polygon((17.6150146872, -15.1364773988), (-20.5555241555, -15.1364773988), (-20.5555241555, -18.9351737499), (-20.5555241555, -18.9464773988), (-7.8555241555, -18.9464773988), (4.9150146872, -18.9464773988), (17.6150146872, -18.9464773988), align=None)
        with BuildLine():
            Line((-1.4053100822, -11.3265351824), (-18.5503100822, -11.3265351824))
            ThreePointArc((-18.5503100822, -11.3265351824), (-19.1441813337, -12.7085505242), (-20.5555241555, -13.2288974349))
            Line((-20.5555241555, -13.2288974349), (-20.5555241555, -15.1364773988))
            Line((-20.5555241555, -15.1364773988), (17.6150146872, -15.1364773988))
            Line((17.6150146872, -15.1364773988), (17.6150146872, -13.2313040347))
            ThreePointArc((17.6150146872, -13.2313040347), (16.2872002651, -12.6630406418), (15.7396899178, -11.3265351824))
            Line((15.7396899178, -11.3265351824), (-1.4053100822, -11.3265351824))
        make_face()
        with BuildLine():
            Line((17.6150146872, -11.3265351824), (15.7396899178, -11.3265351824))
            ThreePointArc((15.7396899178, -11.3265351824), (16.2872002651, -12.6630406418), (17.6150146872, -13.2313040347))
            Line((17.6150146872, -13.2313040347), (17.6150146872, -11.3265351824))
        make_face()
        with BuildLine():
            Line((-20.4553100822, -11.3265351824), (-20.4553100822, -9.4215351824))
            ThreePointArc((-20.4553100822, -9.4215351824), (-20.505434473, -9.4221947335), (-20.5555241555, -9.42417293))
            Line((-20.5555241555, -9.42417293), (-20.5555241555, -13.2288974349))
            ThreePointArc((-20.5555241555, -13.2288974349), (-19.1441813337, -12.7085505242), (-18.5503100822, -11.3265351824))
            Line((-18.5503100822, -11.3265351824), (-20.4553100822, -11.3265351824))
        make_face()
        with BuildLine():
            Line((4.9150146872, -18.9464773988), (-7.8555241555, -18.9464773988))
            Line((-7.8555241555, -18.9464773988), (-7.8555241555, -23.7456746399))
            Line((-7.8555241555, -23.7456746399), (-3.8515047342, -23.7456746399))
            ThreePointArc((-3.8515047342, -23.7456746399), (-1.4702547342, -21.3644246399), (0.9109952658, -23.7456746399))
            Line((0.9109952658, -23.7456746399), (4.9150146872, -23.7456746399))
            Line((4.9150146872, -23.7456746399), (4.9150146872, -18.9464773988))
        make_face()
    extrude(amount=F4_DEPTH)


with BuildPart() as f5:
    # F5 (new): a face of the model
    f5_faces = [f1.part.faces().sort_by_distance(p)[0] for p in [
        (-1.4702547342, -2.54, -21.1098954037),
    ]]
    extrude(f5_faces, amount=F5_DEPTH)


with BuildPart() as f1_1:
    add(f1.part)

    # F6 (on Top) → F7 (cut, two sides)
    with BuildSketch(Plane.XY) as f7_sk:
        with Locations((15.8150778152, -26.0699142236)):
            Rectangle(F6_W, F6_H)
        with Locations((-18.7530079857, -26.1291065253)):
            Rectangle(F6_W_2, F6_H_2)
    extrude(amount=-F7_DEPTH, mode=Mode.SUBTRACT)
    extrude(f7_sk.sketch, amount=F7_DEPTH_BACK, mode=Mode.SUBTRACT)


solid = Compound([f3.part, f4.part, f5.part, f1_1.part])
